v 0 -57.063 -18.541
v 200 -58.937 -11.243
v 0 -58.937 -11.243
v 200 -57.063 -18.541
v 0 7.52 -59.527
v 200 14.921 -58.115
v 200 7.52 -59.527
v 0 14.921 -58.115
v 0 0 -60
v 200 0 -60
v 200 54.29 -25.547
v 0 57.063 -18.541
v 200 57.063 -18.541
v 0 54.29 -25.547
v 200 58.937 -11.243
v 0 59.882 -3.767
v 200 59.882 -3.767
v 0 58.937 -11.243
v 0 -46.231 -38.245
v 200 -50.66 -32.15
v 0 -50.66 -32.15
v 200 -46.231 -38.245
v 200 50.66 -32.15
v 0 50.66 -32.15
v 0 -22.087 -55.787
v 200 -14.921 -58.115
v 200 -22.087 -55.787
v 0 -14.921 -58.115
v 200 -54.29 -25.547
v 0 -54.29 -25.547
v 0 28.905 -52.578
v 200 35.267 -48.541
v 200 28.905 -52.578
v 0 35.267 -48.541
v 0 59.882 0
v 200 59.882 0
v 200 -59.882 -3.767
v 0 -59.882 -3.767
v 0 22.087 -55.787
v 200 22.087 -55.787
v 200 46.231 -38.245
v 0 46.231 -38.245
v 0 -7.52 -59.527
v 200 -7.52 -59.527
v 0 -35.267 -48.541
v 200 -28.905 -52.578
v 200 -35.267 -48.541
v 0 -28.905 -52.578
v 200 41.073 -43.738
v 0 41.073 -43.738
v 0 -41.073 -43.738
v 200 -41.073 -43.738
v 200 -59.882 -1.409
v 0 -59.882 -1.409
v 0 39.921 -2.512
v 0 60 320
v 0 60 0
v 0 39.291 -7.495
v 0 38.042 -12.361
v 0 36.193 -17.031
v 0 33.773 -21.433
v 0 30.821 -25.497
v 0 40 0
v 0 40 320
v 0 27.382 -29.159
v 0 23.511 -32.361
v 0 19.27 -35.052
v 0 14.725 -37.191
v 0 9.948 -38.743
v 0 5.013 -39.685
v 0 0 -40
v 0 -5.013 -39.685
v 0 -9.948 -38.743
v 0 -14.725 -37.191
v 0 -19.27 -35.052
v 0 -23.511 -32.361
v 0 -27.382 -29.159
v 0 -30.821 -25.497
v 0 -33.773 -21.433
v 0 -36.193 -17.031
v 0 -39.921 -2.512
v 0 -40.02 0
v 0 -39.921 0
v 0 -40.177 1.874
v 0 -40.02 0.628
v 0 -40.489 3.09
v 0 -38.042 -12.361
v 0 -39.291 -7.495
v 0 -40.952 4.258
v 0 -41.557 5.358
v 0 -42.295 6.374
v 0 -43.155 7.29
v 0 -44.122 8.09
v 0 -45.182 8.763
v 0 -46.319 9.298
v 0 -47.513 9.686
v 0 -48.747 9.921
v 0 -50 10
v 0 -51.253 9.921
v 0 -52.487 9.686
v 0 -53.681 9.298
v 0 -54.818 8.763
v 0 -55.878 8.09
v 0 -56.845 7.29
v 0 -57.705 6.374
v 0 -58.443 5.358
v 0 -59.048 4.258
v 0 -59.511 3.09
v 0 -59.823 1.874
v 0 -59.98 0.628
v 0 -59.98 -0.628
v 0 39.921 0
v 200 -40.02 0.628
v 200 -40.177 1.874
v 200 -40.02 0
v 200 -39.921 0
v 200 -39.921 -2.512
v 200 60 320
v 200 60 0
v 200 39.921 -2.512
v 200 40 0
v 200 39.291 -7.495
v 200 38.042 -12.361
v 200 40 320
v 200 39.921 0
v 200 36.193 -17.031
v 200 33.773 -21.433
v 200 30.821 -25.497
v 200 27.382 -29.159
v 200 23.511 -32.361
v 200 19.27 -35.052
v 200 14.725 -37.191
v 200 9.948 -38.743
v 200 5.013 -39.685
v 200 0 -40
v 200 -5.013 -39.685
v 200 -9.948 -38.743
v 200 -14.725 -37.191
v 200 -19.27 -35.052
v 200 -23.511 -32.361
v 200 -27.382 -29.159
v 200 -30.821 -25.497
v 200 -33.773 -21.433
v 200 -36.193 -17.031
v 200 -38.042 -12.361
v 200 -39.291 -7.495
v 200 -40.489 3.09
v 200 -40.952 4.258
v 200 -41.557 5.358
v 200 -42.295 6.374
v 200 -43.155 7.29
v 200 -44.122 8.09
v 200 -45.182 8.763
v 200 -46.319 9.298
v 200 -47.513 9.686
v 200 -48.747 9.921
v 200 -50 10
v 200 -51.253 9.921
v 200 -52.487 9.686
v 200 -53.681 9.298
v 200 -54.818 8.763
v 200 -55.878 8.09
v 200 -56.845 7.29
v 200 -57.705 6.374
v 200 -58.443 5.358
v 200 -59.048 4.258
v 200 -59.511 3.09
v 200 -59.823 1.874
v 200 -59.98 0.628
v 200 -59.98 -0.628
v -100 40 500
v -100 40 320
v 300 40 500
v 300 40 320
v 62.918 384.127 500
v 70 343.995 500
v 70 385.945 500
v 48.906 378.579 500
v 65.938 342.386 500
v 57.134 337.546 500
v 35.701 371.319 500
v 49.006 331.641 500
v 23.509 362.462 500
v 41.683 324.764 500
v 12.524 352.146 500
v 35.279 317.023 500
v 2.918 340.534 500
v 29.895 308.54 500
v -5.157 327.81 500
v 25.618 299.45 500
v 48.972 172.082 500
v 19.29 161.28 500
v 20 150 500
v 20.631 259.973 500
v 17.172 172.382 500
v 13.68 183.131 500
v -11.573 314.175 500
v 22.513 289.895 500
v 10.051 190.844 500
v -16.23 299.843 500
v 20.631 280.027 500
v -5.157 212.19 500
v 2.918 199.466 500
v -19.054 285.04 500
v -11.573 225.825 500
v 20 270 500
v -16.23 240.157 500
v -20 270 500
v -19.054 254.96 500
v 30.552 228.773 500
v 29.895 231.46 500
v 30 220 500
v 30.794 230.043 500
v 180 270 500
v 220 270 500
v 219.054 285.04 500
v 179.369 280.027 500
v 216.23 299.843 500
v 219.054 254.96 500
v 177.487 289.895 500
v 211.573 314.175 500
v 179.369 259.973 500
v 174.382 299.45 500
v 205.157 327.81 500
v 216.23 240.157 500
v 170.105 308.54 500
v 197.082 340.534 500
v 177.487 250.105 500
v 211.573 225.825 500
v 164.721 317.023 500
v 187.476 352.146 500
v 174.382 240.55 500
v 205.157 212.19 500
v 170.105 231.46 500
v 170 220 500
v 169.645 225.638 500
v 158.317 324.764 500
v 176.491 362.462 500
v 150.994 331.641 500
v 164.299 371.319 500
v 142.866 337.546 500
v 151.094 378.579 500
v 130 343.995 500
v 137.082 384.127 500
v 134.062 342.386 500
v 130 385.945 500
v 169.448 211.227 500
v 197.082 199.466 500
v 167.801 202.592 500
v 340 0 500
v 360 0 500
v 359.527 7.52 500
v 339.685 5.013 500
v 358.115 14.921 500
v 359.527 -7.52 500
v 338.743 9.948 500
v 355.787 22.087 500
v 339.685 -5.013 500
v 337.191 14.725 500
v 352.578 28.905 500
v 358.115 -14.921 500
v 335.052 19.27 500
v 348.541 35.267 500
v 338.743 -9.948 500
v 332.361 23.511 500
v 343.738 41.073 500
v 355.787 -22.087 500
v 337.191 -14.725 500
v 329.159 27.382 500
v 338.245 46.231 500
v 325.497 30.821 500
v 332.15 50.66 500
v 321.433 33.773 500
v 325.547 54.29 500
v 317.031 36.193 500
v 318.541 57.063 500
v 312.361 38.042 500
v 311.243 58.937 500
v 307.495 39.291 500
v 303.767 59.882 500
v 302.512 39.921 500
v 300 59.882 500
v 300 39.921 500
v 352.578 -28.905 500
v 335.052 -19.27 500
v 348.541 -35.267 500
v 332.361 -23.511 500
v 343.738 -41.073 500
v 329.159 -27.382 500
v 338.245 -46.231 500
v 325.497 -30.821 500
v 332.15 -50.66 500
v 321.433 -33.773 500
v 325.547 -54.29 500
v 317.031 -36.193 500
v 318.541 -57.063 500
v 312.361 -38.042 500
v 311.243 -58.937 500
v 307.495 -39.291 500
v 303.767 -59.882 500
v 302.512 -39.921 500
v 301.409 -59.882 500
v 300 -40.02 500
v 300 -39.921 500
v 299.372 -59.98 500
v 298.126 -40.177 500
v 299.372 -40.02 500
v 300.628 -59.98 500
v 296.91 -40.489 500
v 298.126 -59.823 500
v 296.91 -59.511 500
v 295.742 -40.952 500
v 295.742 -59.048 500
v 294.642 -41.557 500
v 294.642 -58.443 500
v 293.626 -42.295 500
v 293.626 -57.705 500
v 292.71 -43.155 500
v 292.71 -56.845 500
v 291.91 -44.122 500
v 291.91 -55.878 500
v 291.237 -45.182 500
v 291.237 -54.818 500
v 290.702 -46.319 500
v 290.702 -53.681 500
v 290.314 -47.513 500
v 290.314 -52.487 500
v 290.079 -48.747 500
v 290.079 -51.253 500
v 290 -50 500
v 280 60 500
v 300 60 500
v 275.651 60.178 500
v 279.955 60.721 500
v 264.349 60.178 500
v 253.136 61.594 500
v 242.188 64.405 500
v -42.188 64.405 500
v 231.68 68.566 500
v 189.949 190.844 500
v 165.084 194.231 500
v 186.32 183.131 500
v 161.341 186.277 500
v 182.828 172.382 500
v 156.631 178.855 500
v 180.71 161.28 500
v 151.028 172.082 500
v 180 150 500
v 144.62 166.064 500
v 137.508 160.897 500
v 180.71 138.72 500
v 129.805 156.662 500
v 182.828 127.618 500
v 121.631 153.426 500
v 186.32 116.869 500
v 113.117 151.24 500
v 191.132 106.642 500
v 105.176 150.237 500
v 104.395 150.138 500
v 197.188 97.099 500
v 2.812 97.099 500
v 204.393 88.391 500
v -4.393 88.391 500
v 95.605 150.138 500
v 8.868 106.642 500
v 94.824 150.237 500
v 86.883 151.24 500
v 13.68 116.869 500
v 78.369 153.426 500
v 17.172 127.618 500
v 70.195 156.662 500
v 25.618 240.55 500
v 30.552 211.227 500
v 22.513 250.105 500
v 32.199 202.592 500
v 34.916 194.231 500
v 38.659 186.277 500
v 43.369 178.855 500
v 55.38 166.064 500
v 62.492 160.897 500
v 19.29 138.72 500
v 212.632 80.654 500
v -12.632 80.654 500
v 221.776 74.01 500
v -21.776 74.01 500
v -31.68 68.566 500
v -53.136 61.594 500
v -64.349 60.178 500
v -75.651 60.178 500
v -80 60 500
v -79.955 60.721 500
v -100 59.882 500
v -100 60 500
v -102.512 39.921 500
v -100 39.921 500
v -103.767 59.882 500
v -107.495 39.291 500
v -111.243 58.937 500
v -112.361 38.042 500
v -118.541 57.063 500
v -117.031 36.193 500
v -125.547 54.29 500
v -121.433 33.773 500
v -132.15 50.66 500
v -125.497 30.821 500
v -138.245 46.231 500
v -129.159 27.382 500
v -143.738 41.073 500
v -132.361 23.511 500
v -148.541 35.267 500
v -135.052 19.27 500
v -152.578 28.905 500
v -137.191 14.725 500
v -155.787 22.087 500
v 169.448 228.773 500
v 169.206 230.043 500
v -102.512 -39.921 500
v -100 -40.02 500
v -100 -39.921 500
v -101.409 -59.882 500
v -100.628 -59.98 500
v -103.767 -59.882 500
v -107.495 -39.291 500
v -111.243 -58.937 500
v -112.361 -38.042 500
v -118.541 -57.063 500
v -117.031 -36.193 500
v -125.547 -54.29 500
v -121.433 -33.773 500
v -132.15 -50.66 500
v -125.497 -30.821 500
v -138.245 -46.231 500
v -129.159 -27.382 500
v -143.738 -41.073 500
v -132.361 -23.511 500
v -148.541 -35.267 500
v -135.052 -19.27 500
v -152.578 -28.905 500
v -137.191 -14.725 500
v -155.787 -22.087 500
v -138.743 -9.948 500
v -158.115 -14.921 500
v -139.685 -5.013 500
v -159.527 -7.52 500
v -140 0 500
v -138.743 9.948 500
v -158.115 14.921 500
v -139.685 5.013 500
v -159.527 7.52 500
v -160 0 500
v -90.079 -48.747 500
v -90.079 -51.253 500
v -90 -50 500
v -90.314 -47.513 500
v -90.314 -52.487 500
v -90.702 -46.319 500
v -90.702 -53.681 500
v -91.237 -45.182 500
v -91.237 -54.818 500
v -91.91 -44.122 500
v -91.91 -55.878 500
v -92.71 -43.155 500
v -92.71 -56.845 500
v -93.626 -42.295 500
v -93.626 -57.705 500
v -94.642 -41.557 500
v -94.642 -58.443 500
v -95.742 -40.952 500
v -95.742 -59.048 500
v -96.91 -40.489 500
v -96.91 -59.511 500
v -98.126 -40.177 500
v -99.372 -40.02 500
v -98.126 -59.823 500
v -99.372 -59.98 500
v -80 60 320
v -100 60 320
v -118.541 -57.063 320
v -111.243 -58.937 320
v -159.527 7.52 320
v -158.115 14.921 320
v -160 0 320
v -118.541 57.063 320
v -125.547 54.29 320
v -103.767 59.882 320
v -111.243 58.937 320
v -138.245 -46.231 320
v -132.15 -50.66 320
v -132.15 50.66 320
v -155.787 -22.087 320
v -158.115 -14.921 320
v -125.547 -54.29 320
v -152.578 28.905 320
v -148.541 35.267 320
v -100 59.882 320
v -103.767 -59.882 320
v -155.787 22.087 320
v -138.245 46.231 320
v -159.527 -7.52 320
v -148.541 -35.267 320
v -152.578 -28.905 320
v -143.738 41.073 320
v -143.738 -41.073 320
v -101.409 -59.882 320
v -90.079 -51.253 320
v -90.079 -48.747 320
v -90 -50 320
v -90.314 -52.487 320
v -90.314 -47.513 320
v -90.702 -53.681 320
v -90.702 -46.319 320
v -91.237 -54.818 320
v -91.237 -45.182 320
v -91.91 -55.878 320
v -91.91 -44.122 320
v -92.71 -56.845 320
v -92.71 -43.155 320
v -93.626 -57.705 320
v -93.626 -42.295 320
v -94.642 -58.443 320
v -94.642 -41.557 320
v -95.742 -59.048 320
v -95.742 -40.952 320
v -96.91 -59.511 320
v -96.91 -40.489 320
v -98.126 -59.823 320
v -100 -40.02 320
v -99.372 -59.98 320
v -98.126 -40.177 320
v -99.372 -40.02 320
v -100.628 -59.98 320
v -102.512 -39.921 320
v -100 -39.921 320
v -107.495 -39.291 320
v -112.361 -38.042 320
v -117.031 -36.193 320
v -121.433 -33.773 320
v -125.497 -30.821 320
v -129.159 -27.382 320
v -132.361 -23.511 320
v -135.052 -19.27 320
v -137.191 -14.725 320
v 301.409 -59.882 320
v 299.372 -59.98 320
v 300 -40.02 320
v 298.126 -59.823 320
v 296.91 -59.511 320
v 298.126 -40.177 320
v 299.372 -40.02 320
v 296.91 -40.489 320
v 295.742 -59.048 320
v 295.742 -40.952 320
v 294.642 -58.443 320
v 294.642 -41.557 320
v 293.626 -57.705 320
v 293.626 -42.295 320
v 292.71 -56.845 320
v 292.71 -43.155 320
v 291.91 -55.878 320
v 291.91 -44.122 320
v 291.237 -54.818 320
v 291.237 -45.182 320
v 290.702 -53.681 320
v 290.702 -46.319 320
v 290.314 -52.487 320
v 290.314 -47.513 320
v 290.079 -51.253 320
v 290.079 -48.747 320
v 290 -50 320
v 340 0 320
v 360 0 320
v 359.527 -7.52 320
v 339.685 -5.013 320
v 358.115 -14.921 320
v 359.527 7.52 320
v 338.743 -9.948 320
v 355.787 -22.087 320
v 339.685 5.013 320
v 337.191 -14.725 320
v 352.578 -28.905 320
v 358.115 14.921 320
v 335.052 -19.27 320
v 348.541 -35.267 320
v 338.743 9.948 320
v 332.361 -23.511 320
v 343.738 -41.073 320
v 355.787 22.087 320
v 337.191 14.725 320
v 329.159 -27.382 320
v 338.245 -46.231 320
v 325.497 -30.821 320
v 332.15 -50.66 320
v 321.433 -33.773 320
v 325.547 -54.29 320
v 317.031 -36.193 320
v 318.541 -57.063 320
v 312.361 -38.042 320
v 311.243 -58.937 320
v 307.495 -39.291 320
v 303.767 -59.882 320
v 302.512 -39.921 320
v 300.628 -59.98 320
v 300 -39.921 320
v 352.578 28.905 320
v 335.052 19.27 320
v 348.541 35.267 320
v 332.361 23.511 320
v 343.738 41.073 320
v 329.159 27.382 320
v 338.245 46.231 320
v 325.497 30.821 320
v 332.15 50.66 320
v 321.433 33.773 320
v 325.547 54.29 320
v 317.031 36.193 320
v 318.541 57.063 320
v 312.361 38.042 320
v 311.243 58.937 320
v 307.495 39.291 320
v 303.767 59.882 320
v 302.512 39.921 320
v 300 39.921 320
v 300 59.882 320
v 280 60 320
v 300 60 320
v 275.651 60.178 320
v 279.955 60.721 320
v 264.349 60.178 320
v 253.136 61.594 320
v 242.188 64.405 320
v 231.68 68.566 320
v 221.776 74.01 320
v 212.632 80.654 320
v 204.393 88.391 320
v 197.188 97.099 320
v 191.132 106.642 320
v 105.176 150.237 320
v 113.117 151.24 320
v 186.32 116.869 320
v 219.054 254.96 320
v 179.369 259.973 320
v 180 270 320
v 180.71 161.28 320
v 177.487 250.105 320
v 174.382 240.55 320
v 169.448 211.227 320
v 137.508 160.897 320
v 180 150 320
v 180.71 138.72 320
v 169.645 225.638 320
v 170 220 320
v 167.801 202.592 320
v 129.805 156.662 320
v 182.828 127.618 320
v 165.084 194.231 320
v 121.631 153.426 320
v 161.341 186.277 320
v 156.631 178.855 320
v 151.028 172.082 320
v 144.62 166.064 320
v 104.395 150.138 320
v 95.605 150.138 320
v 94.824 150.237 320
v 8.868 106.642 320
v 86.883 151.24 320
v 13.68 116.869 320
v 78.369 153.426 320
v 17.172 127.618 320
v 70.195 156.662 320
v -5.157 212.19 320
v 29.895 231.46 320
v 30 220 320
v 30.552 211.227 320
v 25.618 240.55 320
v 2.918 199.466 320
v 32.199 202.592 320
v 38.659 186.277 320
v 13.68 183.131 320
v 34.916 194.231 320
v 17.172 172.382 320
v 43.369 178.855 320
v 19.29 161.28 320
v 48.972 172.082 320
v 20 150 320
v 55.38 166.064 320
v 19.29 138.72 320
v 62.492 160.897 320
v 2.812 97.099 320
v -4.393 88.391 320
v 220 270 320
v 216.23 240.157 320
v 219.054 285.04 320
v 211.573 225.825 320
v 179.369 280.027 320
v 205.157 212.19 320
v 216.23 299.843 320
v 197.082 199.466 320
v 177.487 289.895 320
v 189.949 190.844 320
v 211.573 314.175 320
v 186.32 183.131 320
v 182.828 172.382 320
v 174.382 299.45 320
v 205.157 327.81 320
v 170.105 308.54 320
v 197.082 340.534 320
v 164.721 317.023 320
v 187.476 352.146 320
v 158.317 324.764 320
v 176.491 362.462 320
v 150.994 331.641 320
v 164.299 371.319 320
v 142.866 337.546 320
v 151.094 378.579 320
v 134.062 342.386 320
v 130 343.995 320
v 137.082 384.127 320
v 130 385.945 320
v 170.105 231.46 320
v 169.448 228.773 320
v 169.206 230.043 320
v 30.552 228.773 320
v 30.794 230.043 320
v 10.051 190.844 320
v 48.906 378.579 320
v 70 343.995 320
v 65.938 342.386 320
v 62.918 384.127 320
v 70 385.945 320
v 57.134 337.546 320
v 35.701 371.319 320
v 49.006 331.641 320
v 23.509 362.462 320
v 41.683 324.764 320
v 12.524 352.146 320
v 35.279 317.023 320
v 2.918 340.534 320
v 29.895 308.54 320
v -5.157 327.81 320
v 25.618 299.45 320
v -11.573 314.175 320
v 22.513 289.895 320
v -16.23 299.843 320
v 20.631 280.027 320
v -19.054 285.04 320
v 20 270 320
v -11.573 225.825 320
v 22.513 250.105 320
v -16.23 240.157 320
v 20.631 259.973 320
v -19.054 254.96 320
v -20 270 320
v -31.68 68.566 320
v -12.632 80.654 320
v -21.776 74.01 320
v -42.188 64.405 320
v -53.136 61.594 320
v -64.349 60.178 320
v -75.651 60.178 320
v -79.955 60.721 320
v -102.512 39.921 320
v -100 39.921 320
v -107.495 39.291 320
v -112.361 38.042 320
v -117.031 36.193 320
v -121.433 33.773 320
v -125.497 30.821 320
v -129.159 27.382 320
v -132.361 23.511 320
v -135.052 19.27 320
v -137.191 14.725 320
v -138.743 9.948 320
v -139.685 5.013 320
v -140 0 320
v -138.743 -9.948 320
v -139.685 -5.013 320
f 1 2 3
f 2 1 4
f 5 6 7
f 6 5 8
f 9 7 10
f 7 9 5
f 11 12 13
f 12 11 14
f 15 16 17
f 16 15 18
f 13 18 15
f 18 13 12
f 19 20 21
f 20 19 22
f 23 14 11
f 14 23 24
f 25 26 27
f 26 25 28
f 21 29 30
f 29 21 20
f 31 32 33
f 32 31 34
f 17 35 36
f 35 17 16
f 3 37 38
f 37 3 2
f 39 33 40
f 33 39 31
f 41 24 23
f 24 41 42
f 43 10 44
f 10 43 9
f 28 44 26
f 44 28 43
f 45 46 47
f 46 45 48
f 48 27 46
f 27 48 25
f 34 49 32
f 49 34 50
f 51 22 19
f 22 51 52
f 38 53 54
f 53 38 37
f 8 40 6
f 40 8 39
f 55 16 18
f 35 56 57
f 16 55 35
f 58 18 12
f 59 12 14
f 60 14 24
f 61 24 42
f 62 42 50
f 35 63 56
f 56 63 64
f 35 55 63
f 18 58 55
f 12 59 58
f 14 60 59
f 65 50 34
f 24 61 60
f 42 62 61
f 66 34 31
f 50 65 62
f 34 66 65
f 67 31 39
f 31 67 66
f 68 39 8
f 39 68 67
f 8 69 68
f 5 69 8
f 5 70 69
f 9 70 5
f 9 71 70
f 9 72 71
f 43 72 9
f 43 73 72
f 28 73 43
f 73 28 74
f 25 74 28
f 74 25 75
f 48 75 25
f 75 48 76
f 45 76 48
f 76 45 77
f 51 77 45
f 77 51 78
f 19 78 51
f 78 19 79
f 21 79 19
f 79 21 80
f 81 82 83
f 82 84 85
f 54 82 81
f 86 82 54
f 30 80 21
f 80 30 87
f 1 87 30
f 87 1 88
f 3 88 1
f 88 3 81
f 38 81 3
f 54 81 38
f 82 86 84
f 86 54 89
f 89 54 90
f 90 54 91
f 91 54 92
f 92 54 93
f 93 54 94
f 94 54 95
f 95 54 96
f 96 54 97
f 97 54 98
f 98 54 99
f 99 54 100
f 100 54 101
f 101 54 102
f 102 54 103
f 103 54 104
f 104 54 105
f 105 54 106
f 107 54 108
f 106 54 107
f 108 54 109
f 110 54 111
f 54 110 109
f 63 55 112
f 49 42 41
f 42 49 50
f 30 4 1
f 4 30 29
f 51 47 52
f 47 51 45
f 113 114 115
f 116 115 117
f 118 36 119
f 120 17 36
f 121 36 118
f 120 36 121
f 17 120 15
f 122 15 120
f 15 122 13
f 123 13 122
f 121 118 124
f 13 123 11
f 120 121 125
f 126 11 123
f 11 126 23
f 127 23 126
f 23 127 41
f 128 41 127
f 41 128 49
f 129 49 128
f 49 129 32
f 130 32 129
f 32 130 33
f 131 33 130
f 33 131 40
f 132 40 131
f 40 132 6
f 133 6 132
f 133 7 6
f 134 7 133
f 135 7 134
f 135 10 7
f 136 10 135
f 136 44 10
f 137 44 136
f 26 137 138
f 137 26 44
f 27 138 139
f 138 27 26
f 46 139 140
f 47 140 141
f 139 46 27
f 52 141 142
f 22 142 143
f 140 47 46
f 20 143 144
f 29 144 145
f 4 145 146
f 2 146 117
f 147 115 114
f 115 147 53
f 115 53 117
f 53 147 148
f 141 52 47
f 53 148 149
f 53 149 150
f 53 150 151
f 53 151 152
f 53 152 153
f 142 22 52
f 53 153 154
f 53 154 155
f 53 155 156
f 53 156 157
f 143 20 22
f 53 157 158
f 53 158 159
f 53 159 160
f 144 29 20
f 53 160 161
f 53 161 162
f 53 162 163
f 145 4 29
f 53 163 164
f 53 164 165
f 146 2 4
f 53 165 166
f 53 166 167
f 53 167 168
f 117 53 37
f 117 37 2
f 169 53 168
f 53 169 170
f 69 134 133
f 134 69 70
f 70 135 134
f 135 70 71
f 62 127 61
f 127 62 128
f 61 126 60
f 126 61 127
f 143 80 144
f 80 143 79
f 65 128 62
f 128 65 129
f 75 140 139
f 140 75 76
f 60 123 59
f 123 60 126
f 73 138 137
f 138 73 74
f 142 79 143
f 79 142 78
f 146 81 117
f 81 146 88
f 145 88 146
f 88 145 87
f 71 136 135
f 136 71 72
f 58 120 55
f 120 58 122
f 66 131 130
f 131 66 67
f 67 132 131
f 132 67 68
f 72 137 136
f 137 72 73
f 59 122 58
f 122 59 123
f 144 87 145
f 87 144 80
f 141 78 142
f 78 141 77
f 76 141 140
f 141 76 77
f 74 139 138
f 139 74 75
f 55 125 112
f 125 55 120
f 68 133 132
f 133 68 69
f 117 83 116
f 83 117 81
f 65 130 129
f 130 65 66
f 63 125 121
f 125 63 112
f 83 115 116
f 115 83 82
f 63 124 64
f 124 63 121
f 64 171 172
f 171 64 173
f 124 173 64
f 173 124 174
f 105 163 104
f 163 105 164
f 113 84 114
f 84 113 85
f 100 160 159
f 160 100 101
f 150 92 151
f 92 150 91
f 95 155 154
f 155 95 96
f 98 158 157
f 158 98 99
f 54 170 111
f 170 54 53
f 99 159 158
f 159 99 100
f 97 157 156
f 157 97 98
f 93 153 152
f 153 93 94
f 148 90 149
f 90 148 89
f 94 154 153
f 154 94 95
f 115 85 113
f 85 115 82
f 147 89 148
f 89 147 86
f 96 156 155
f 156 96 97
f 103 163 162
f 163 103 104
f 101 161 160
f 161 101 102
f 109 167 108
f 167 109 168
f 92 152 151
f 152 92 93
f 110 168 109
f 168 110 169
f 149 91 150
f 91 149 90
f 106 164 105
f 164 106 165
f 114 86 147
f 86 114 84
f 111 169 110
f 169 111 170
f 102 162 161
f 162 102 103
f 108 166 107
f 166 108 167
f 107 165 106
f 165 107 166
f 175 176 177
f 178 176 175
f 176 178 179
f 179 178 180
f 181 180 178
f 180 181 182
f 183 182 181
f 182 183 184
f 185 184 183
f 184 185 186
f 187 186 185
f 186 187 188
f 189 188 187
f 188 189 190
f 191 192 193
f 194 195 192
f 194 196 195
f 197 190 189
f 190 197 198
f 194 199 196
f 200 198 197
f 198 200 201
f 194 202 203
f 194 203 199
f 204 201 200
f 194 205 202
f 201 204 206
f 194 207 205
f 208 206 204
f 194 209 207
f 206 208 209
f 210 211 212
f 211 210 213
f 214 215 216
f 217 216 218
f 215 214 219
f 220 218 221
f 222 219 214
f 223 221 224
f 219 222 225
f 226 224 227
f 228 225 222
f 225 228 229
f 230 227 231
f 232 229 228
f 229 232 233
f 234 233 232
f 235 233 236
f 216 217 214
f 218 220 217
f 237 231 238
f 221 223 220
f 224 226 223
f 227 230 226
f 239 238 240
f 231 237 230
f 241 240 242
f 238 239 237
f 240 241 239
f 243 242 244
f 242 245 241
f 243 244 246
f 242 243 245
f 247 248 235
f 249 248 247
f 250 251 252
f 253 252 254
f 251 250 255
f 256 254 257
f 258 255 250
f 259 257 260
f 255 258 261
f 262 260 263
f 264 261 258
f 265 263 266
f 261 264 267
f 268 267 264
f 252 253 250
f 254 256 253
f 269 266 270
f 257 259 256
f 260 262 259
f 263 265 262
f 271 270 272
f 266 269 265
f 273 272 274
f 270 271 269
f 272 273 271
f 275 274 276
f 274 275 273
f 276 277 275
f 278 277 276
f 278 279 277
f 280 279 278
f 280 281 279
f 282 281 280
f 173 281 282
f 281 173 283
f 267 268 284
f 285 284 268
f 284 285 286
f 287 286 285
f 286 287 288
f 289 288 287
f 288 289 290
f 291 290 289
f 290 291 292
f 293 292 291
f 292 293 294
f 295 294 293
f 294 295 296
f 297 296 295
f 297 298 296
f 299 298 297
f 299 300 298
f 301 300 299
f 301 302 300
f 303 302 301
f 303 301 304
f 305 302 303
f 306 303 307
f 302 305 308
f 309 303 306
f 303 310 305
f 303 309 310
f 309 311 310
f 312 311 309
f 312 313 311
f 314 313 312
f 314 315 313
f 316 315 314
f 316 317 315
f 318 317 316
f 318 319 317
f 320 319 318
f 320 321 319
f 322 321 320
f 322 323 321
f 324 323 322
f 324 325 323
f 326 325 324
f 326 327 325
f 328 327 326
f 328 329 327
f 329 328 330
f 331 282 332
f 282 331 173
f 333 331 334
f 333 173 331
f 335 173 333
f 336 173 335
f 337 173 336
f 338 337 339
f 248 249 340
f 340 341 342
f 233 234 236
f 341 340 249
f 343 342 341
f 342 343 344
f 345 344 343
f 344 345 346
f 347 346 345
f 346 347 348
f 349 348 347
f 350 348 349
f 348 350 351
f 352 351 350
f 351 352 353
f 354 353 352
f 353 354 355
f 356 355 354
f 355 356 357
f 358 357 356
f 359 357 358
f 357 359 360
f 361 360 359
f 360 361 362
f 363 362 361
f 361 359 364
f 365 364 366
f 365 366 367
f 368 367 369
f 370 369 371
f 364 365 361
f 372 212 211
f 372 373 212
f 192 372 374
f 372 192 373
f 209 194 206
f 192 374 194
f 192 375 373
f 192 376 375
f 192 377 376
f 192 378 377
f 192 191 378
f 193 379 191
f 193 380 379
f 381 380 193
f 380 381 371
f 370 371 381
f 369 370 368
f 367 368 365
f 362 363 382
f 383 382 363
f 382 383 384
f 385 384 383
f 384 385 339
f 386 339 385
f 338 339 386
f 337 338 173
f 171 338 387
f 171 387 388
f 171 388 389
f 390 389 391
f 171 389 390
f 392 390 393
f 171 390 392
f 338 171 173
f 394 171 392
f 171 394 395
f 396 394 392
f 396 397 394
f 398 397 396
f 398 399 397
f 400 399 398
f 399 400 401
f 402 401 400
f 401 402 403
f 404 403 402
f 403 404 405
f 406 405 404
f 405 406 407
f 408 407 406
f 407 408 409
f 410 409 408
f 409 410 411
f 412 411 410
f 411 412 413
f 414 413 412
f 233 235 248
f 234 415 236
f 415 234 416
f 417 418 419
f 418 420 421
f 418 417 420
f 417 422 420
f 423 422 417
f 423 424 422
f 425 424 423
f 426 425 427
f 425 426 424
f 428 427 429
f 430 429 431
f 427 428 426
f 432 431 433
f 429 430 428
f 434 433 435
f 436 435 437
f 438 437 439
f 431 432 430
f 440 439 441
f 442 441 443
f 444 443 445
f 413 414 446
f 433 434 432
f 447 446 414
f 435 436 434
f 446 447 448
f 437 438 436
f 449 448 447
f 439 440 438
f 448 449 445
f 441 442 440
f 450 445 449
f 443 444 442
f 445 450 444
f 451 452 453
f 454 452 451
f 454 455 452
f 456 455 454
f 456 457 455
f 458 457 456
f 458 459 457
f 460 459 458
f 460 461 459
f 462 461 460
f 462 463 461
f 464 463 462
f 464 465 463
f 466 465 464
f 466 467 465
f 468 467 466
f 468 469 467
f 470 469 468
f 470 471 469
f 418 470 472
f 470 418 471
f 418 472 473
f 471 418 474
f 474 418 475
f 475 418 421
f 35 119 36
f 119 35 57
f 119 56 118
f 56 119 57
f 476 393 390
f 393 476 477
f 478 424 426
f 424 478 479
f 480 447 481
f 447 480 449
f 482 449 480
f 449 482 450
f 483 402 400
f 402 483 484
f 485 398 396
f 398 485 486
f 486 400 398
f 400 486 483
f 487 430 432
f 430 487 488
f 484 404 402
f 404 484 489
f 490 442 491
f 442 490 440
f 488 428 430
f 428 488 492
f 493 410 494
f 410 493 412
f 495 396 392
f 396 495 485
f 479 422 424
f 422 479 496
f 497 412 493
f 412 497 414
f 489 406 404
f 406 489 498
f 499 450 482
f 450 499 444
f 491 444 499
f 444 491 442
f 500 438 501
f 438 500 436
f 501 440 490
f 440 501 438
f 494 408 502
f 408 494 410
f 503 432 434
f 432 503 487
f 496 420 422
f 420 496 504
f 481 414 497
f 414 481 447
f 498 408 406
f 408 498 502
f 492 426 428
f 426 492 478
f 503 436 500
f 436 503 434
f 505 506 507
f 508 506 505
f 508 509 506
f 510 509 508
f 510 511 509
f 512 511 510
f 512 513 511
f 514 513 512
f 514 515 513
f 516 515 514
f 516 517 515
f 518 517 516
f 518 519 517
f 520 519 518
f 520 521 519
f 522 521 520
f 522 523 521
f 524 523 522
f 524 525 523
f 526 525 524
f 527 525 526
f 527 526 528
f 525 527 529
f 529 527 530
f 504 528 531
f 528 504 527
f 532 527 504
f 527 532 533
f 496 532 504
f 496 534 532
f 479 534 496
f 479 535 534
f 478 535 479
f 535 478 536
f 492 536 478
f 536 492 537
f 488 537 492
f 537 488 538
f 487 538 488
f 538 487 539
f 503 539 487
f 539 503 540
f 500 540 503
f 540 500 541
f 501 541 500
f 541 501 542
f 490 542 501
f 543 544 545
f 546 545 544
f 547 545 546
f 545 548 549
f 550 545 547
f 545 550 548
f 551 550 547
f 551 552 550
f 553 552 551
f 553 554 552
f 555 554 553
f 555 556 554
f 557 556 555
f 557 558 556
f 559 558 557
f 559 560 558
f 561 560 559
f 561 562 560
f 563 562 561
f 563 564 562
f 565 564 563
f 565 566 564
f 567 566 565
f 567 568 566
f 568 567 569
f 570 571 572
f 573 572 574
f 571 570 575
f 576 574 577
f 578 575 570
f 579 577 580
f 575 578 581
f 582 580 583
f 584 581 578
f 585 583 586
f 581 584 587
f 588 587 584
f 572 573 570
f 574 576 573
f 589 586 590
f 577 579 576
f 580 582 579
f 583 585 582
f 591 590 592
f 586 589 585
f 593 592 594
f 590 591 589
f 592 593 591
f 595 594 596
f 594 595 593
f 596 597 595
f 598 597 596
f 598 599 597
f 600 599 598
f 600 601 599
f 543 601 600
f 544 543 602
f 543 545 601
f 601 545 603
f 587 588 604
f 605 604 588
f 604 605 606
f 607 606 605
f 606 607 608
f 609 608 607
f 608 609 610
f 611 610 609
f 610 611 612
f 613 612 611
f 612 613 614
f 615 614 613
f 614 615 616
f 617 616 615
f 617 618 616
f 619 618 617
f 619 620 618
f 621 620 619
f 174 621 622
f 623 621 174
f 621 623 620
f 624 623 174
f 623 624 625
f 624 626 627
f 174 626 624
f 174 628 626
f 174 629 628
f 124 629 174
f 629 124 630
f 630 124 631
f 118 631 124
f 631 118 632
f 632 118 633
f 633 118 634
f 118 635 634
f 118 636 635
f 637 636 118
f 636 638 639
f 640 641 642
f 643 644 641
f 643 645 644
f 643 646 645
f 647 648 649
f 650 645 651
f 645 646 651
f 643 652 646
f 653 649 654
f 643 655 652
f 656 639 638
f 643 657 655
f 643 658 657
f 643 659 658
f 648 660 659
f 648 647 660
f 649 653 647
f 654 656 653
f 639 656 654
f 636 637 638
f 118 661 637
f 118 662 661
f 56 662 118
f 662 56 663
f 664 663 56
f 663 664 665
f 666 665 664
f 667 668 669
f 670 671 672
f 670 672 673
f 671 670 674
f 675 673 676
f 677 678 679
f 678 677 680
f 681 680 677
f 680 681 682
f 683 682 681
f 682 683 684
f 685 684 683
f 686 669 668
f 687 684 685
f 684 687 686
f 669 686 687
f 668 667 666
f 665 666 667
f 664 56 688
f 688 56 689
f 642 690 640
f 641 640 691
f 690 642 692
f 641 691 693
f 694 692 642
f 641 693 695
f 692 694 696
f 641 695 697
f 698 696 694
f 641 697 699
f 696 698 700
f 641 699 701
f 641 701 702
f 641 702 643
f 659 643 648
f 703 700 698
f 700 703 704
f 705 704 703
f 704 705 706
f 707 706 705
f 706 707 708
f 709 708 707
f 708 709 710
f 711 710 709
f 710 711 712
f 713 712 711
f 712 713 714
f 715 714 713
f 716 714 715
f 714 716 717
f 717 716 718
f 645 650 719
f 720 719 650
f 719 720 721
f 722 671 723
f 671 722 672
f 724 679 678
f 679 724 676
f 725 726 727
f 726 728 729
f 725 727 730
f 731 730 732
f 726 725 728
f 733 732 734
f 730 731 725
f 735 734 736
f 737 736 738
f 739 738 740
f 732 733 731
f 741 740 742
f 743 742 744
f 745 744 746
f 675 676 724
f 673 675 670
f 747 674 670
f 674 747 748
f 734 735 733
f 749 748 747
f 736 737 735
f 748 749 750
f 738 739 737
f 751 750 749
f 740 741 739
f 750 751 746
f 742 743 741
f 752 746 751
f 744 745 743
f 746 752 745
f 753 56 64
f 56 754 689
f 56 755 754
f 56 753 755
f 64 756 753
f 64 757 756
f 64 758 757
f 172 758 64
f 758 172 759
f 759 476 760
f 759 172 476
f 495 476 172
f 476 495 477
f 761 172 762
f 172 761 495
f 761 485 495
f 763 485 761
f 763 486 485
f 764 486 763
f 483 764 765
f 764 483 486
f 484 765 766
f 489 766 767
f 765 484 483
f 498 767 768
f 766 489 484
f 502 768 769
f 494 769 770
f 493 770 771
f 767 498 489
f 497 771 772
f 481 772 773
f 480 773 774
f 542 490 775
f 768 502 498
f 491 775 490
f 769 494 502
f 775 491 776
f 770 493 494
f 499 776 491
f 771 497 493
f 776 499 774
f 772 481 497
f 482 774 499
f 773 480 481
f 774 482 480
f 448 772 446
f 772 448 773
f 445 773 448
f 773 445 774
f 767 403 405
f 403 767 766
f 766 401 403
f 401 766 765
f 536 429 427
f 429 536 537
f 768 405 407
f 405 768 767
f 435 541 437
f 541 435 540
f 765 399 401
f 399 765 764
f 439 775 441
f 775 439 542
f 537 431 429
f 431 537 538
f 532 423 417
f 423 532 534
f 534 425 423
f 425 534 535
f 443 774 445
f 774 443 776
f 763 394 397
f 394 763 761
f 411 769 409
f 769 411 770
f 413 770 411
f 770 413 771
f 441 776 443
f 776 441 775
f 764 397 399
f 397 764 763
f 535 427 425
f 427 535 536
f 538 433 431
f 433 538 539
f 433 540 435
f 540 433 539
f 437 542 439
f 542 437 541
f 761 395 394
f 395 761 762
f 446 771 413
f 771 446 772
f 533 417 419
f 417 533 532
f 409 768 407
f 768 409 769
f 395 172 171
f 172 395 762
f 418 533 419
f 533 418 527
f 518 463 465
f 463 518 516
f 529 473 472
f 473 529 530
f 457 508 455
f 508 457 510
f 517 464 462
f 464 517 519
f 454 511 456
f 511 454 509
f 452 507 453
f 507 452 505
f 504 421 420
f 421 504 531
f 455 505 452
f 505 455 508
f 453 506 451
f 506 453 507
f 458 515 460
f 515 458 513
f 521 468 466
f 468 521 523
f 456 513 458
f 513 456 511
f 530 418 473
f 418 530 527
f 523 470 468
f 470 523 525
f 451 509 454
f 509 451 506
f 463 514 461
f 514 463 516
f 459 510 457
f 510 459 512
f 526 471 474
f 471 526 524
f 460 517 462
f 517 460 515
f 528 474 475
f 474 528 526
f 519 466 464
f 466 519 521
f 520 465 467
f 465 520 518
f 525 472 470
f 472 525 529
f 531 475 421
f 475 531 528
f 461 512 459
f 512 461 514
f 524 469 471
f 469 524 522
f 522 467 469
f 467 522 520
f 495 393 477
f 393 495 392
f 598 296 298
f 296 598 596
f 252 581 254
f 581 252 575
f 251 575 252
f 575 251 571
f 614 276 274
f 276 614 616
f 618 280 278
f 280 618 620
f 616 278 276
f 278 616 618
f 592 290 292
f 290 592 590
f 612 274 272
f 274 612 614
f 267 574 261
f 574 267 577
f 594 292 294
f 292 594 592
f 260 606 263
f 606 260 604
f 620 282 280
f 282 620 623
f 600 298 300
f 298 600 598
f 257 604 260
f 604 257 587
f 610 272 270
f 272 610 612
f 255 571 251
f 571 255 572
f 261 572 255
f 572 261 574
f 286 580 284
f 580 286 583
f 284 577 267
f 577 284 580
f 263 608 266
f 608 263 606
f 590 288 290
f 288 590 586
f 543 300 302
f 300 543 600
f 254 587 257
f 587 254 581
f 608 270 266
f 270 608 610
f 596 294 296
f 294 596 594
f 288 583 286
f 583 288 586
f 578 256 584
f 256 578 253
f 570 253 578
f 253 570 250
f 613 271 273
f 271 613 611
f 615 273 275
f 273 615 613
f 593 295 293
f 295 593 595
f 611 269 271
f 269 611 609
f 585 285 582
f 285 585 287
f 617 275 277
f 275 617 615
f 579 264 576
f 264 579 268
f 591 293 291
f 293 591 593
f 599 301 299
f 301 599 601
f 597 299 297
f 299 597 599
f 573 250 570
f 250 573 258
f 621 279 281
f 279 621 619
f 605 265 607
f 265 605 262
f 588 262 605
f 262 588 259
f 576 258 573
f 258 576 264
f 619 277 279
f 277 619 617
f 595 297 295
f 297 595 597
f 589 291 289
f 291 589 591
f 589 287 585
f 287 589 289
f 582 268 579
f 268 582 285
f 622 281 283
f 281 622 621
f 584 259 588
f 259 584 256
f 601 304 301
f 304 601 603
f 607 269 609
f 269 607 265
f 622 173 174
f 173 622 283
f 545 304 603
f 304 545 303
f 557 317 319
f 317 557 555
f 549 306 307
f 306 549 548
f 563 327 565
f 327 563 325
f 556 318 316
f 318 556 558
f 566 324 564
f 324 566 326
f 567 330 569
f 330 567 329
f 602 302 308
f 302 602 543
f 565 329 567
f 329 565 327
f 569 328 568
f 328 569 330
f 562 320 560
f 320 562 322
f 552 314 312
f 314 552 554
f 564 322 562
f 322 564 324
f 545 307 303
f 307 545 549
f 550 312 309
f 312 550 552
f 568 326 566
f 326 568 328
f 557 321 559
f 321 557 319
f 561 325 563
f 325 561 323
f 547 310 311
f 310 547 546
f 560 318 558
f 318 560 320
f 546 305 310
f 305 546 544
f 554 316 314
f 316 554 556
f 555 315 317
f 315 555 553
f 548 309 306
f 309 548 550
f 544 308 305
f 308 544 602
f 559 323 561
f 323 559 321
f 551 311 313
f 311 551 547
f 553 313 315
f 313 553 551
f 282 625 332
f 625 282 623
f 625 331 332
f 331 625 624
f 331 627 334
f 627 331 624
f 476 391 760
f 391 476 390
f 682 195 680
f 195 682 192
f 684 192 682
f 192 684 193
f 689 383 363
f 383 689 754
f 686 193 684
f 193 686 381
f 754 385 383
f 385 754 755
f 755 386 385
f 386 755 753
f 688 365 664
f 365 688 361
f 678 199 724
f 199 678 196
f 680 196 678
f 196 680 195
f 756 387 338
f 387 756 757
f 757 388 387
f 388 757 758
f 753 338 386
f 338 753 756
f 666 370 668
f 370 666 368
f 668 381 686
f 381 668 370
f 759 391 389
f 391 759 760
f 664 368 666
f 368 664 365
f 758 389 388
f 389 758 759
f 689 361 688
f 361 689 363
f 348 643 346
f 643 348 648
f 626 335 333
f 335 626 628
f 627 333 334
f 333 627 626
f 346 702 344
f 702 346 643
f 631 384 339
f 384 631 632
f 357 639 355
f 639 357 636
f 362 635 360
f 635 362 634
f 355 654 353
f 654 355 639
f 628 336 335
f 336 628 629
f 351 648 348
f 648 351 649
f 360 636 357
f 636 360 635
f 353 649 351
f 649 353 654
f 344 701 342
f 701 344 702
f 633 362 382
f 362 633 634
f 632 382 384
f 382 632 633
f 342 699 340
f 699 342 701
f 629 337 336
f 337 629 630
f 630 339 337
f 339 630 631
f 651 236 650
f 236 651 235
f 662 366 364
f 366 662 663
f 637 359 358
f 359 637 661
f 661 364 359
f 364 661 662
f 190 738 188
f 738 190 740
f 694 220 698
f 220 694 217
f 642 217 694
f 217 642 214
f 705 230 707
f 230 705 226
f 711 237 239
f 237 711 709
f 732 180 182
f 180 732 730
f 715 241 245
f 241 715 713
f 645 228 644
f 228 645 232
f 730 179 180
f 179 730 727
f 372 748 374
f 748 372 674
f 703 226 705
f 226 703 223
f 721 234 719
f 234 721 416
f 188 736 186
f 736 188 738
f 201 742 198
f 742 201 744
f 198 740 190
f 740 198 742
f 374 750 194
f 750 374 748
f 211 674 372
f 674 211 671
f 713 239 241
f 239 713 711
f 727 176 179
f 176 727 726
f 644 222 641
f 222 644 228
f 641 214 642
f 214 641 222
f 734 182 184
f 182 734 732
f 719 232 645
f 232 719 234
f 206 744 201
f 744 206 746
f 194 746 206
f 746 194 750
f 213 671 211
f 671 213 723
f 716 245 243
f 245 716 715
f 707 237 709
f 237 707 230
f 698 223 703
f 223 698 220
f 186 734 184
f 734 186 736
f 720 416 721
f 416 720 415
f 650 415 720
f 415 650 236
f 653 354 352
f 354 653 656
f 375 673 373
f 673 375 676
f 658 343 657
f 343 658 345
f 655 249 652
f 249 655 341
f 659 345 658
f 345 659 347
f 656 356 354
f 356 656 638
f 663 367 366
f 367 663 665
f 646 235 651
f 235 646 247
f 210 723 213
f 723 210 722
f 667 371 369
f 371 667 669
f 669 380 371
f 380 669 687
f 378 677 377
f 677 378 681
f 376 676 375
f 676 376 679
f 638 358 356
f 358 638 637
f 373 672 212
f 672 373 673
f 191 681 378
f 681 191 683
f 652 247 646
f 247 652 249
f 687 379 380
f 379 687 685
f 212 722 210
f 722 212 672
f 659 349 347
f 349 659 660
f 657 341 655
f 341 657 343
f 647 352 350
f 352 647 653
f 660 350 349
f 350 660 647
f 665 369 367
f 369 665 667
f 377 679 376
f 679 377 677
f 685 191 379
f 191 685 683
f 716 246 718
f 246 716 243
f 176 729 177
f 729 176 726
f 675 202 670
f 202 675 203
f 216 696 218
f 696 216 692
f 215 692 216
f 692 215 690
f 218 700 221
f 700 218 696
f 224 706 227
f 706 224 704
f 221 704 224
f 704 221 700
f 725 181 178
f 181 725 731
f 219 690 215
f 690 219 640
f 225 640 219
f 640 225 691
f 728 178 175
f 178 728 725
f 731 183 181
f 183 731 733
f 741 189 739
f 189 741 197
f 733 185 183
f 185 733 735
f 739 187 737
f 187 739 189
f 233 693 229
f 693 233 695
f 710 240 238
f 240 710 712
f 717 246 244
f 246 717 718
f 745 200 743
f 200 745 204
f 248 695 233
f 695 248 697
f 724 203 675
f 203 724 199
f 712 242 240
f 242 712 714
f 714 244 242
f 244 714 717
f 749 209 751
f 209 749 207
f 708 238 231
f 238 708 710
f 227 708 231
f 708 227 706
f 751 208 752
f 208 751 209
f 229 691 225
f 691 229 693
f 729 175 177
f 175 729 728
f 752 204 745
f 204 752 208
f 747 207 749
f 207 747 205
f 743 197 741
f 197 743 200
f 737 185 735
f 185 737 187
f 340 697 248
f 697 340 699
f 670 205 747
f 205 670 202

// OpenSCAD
$fn=50;
//unterer Arm
union() {

//Halterung  
difference(){
    rotate([0,90,0])
        difference(){
            cylinder(200,60,60);
            translate([0,0,-1])
                cylinder(202,40,40);
    }
    translate([-1,-60,0])
    cube([202,100,60]);
}

rotate([0,90,0])
    translate([0,-50,0])
        cylinder(200,10,10);

//Rückwand
translate([0,40,0])
    cube([200,20,500]);
}

//linker Arm
rotate([0,90,0])
    translate([-500,0,-100])
union() {

//Halterung  
difference(){
    rotate([0,90,0])
        difference(){
            cylinder(180,60,60);
            translate([0,0,-1])
                cylinder(182,40,40);
    }
    translate([-1,-60,0])
        cube([182,100,60]);
}

rotate([0,90,0])
    translate([0,-50,0])
        cylinder(180,10,10);

//Rückwand
translate([0,40,0])
    cube([180,20,100]);
}

//rechter Arm
rotate([0,-90,0])
    translate([300,0,-300])
union() {

//Halterung  
difference(){
    translate([20,0,0])
    rotate([0,90,0])
        difference(){
            cylinder(180,60,60);
            translate([0,0,-1])
                cylinder(282,40,40);
    }
    translate([19,-60,0])
    cube([182,100,60]);
}

rotate([0,90,0])
    translate([0,-50,20])
        cylinder(180,10,10);

//Rückwand
translate([20,40,0])
    cube([180,20,100]);
}

//Lenkerhalterung
//Halbkugel
difference(){
translate([100,60,320])
    difference() {
        cylinder(180,180,180);
        translate([-190,-220,-200])
            cube([380,200,400]);
    }
    union(){
translate([200,39,160])
    cube([100,180,140]);
translate([-100,39,160])
    cube([100,180,140]);
rotate([0,90,0])
    translate([-150,210,-1])
        cylinder(202,150,150);
translate([-70,150,299])
    cylinder(202,90,90);
translate([270,150,299])
    cylinder(202,90,90);
translate([100,220,199])
    cylinder(302,70,70);
    }
}

//Zylinder
translate([100,270,320])
difference(){
cylinder(180,120,120);
    union(){
        translate([0,0,-1])
            cylinder(182,80,80);
        translate([0,-50,-1])
            cylinder(182,70,70);
        translate([-30,70,-1])
            cube([60,50,182]);
    }
}

    
